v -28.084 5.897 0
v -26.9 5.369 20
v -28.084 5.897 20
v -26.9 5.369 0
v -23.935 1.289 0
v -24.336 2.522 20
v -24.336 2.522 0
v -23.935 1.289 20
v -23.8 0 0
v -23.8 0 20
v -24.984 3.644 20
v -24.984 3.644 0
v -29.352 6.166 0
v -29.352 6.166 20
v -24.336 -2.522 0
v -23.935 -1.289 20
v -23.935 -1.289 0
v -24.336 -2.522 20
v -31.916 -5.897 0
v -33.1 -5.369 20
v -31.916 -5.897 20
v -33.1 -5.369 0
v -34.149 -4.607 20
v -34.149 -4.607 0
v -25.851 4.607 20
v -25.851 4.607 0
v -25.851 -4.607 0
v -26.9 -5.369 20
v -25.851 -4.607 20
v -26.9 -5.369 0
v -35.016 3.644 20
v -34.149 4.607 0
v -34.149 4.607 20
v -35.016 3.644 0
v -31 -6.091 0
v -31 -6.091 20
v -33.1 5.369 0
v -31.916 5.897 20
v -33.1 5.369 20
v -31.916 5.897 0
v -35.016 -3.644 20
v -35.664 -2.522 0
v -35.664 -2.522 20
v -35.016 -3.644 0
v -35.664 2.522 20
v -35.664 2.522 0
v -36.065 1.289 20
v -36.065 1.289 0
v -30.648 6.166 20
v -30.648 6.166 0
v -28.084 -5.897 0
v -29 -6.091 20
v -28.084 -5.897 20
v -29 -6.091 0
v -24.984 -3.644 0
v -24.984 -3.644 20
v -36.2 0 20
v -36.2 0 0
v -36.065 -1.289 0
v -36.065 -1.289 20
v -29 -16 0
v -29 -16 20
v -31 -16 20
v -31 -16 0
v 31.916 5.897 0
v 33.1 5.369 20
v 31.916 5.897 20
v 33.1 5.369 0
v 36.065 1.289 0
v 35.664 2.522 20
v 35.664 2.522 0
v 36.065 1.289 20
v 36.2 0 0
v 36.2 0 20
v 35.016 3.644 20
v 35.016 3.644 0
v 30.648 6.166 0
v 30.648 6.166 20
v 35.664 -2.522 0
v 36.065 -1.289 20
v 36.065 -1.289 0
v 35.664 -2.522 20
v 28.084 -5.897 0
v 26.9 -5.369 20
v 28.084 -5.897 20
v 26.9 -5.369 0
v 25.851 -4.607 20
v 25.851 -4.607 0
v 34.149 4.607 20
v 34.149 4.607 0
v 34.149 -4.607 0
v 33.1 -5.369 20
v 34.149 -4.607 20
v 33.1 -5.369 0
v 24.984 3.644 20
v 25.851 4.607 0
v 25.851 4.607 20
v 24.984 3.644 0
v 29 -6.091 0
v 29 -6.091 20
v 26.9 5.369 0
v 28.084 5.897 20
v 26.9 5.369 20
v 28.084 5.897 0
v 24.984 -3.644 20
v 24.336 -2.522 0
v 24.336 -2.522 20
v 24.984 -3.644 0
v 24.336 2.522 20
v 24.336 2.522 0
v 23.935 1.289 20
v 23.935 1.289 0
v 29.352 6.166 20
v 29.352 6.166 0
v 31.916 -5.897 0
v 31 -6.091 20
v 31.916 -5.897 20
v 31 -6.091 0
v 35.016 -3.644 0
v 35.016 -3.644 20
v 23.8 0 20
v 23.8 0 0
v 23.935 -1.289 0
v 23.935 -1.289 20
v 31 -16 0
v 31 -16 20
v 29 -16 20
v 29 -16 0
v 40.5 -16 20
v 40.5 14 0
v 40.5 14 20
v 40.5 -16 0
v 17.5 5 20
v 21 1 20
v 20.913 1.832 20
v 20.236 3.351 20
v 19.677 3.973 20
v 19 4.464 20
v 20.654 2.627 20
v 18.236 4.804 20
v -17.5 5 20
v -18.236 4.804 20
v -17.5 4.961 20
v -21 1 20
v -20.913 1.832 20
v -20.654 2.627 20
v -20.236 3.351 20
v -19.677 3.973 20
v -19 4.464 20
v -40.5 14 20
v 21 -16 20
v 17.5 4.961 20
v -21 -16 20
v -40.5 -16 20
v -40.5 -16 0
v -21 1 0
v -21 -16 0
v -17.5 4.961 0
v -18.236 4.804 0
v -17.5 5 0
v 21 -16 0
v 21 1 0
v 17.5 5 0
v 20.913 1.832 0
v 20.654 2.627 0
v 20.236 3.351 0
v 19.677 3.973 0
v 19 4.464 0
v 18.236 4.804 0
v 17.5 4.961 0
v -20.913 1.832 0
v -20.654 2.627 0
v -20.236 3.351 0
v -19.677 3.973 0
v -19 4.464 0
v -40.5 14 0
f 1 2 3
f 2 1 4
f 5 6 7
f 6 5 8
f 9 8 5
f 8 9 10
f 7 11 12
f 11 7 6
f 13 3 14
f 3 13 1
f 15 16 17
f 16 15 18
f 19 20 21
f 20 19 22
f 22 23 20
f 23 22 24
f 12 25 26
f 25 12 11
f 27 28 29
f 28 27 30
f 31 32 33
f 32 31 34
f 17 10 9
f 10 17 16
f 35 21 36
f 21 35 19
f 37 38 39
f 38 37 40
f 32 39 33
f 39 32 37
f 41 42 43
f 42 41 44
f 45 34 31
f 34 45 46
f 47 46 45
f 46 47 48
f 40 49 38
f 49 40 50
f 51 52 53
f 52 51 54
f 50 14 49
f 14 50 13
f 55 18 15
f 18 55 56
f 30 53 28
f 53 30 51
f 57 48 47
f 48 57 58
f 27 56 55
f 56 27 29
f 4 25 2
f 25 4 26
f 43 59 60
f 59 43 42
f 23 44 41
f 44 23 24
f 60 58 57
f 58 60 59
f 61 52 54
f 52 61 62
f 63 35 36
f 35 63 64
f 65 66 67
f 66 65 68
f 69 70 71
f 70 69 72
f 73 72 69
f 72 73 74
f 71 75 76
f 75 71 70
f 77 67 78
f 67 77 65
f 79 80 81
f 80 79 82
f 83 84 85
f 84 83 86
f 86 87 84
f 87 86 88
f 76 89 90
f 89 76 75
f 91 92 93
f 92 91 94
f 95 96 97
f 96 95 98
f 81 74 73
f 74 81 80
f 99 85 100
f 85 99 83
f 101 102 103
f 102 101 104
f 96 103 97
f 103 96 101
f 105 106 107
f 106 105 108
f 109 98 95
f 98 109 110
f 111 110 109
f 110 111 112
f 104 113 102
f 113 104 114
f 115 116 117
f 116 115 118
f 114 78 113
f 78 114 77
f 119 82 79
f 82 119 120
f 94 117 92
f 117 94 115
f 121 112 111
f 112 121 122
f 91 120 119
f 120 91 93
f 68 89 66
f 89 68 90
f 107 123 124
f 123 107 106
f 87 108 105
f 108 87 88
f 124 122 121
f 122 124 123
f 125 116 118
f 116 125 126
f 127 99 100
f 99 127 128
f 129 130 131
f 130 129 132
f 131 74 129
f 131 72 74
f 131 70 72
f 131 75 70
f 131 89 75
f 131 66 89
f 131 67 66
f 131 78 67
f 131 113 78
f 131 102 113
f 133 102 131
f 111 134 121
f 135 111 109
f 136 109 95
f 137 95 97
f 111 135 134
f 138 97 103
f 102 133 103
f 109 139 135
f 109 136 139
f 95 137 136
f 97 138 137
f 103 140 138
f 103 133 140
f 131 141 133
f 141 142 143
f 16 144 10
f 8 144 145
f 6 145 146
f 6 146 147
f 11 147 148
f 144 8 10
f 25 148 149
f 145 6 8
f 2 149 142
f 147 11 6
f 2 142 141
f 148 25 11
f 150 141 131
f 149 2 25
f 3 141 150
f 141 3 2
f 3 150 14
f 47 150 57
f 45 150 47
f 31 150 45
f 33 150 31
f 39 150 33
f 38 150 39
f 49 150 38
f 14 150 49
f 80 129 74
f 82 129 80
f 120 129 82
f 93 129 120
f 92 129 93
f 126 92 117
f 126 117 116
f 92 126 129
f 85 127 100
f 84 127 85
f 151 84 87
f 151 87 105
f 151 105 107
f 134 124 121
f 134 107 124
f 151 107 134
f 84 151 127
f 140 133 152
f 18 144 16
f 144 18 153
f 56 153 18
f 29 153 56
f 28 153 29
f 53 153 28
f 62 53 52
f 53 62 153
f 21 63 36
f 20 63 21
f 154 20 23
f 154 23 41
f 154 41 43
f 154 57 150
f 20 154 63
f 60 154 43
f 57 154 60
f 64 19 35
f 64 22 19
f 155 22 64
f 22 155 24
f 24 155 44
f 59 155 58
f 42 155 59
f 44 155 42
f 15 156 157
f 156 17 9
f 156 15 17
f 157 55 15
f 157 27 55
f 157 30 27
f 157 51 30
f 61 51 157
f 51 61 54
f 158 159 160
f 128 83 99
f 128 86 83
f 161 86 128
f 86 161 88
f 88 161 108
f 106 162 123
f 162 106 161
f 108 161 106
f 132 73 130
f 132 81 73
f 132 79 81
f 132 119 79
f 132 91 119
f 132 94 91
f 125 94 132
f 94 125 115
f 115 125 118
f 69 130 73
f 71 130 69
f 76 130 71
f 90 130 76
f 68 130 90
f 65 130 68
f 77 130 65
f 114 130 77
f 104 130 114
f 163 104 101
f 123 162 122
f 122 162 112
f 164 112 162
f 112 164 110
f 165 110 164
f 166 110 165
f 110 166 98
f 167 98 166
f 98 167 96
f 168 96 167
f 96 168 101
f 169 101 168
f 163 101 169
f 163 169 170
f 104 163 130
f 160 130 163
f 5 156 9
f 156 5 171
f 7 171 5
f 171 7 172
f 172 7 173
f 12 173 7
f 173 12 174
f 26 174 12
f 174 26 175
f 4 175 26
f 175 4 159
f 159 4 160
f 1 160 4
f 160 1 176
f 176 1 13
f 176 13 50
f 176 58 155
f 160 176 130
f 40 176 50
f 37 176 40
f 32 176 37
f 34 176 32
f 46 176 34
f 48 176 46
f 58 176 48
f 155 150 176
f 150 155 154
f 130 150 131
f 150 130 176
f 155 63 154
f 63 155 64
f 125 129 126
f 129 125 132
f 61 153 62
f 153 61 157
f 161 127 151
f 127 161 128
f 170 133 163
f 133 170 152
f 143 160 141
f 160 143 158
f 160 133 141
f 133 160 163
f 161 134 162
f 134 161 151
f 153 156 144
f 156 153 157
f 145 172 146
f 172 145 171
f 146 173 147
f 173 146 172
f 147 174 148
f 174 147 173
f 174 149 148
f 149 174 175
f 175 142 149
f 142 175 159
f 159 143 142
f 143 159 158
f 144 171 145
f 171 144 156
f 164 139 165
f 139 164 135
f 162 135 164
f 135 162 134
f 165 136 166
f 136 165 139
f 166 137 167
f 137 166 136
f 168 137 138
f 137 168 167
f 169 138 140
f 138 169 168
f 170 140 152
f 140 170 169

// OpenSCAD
// Rostock Bracket from Jcrocholl modified to take 12mm smooth rods by Kolergy
//    - Increase sandwitch mount size & rod mounting slots
//    - Repositioned screws



$fa = 12;
$fs = 0.5;

w = 60; // Smooth rod distance (center to center)

module screws() {
  for (x = [-w/2, w/2]) {
    translate([x, 0, 0]) {
	 // Push-through M3 screw hole.
      translate([0, -10, 0]) rotate([0, 90, 0]) cylinder(r=1.65, h=25, center=true); 
	 // M3 nut holder.
      translate([-x/3.8, -10, 0]) rotate([0, 90, 0]) cylinder(r=3.2, h=2.3, center=true, $fn=6);  //rotate([30, 0, 0]) 
    }
  }
}

module bracket(h) {
  difference() {
    union() {
      translate([   0, -1, 0]) cube([w+21, 30, h], center=true);
      // Sandwich mount.
      //translate([-w/2, 12.5, 0]) cylinder(r=9, h=h, center=true);
      //translate([ w/2, 12.5, 0]) cylinder(r=9, h=h, center=true);
    }
    // Sandwich mount.
    //translate([-w/2, 13, 0]) cylinder(r=1.9, h=h+1, center=true);
    //translate([ w/2, 13, 0]) cylinder(r=1.9, h=h+1, center=true);
    // Smooth rod mounting slots.
    for (x = [-w/2, w/2]) {
      translate([x, 0, 0]) {
		cylinder(r=6.2, h=h+1, center=true);
		translate([0, -10, 0]) cube([2, 20, h+1], center=true);
      }
    }
    // Belt path.
    translate([0, -5, 0]) cube([w-25, 20, h+1], center=true);
    translate([0, -9, 0]) cube([w-18, 20, h+1], center=true);
    translate([-w/2+13, 1, 0]) cylinder(r=4, h=h+1, center=true);
    translate([ w/2-13, 1, 0]) cylinder(r=4, h=h+1, center=true);
  }
}

translate([0, 0, 10]) bracket(20);
